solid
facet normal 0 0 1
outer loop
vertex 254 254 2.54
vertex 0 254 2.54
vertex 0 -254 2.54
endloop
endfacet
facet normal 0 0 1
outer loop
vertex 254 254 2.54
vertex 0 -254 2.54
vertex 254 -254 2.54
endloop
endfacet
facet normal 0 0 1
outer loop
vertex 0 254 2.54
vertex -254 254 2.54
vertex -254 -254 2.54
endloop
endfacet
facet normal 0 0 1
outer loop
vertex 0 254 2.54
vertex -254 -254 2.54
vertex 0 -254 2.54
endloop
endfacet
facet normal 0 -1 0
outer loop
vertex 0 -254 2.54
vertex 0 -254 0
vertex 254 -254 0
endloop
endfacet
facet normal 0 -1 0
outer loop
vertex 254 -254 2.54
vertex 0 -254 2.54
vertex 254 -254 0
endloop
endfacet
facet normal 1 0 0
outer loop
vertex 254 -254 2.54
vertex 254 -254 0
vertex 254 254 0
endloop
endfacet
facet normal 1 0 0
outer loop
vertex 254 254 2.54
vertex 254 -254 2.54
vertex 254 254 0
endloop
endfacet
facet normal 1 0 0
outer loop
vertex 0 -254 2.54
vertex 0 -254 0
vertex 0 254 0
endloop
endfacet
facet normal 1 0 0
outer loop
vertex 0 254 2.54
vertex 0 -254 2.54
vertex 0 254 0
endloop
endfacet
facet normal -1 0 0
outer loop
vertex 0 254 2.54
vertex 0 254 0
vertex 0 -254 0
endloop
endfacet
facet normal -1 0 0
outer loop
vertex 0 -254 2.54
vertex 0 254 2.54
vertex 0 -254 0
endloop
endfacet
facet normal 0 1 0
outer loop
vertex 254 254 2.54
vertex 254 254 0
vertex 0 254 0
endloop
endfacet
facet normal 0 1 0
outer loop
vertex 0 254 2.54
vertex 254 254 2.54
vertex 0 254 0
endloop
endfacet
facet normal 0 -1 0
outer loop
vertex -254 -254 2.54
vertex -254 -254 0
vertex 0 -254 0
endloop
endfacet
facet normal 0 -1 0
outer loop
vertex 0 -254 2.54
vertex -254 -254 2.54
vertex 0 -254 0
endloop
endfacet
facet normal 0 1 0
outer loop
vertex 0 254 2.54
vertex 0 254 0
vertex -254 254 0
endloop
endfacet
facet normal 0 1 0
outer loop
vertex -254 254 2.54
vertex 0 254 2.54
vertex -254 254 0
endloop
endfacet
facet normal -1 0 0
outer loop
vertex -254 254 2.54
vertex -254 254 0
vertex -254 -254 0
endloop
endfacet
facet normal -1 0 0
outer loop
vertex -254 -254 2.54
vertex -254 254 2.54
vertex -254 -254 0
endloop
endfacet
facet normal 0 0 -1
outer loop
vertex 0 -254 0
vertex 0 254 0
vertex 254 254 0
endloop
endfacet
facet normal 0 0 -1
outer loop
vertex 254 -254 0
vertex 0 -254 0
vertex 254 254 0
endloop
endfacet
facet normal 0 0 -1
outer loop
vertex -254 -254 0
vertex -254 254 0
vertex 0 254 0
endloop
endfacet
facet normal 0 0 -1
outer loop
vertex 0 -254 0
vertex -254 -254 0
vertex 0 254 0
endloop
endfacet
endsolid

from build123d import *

# Parameters (mm, degrees)
F1_DEPTH = 2.54
F2_DEPTH = 2.54


with BuildPart() as f1:
    # F0 (on Top) → F1 (new body)
    with BuildSketch(Plane.XY):
        Polygon((0, -254), (0, 254), (-254, 254), (-254, 0), (-254, -254), align=None)
    extrude(amount=F1_DEPTH)


with BuildPart() as f2:
    # F0 (on Top) → F2 (new body)
    with BuildSketch(Plane.XY):
        Polygon((254, 254), (0, 254), (0, -254), (254, -254), (254, 0), align=None)
    extrude(amount=F2_DEPTH)


solid = Compound([f1.part, f2.part])
